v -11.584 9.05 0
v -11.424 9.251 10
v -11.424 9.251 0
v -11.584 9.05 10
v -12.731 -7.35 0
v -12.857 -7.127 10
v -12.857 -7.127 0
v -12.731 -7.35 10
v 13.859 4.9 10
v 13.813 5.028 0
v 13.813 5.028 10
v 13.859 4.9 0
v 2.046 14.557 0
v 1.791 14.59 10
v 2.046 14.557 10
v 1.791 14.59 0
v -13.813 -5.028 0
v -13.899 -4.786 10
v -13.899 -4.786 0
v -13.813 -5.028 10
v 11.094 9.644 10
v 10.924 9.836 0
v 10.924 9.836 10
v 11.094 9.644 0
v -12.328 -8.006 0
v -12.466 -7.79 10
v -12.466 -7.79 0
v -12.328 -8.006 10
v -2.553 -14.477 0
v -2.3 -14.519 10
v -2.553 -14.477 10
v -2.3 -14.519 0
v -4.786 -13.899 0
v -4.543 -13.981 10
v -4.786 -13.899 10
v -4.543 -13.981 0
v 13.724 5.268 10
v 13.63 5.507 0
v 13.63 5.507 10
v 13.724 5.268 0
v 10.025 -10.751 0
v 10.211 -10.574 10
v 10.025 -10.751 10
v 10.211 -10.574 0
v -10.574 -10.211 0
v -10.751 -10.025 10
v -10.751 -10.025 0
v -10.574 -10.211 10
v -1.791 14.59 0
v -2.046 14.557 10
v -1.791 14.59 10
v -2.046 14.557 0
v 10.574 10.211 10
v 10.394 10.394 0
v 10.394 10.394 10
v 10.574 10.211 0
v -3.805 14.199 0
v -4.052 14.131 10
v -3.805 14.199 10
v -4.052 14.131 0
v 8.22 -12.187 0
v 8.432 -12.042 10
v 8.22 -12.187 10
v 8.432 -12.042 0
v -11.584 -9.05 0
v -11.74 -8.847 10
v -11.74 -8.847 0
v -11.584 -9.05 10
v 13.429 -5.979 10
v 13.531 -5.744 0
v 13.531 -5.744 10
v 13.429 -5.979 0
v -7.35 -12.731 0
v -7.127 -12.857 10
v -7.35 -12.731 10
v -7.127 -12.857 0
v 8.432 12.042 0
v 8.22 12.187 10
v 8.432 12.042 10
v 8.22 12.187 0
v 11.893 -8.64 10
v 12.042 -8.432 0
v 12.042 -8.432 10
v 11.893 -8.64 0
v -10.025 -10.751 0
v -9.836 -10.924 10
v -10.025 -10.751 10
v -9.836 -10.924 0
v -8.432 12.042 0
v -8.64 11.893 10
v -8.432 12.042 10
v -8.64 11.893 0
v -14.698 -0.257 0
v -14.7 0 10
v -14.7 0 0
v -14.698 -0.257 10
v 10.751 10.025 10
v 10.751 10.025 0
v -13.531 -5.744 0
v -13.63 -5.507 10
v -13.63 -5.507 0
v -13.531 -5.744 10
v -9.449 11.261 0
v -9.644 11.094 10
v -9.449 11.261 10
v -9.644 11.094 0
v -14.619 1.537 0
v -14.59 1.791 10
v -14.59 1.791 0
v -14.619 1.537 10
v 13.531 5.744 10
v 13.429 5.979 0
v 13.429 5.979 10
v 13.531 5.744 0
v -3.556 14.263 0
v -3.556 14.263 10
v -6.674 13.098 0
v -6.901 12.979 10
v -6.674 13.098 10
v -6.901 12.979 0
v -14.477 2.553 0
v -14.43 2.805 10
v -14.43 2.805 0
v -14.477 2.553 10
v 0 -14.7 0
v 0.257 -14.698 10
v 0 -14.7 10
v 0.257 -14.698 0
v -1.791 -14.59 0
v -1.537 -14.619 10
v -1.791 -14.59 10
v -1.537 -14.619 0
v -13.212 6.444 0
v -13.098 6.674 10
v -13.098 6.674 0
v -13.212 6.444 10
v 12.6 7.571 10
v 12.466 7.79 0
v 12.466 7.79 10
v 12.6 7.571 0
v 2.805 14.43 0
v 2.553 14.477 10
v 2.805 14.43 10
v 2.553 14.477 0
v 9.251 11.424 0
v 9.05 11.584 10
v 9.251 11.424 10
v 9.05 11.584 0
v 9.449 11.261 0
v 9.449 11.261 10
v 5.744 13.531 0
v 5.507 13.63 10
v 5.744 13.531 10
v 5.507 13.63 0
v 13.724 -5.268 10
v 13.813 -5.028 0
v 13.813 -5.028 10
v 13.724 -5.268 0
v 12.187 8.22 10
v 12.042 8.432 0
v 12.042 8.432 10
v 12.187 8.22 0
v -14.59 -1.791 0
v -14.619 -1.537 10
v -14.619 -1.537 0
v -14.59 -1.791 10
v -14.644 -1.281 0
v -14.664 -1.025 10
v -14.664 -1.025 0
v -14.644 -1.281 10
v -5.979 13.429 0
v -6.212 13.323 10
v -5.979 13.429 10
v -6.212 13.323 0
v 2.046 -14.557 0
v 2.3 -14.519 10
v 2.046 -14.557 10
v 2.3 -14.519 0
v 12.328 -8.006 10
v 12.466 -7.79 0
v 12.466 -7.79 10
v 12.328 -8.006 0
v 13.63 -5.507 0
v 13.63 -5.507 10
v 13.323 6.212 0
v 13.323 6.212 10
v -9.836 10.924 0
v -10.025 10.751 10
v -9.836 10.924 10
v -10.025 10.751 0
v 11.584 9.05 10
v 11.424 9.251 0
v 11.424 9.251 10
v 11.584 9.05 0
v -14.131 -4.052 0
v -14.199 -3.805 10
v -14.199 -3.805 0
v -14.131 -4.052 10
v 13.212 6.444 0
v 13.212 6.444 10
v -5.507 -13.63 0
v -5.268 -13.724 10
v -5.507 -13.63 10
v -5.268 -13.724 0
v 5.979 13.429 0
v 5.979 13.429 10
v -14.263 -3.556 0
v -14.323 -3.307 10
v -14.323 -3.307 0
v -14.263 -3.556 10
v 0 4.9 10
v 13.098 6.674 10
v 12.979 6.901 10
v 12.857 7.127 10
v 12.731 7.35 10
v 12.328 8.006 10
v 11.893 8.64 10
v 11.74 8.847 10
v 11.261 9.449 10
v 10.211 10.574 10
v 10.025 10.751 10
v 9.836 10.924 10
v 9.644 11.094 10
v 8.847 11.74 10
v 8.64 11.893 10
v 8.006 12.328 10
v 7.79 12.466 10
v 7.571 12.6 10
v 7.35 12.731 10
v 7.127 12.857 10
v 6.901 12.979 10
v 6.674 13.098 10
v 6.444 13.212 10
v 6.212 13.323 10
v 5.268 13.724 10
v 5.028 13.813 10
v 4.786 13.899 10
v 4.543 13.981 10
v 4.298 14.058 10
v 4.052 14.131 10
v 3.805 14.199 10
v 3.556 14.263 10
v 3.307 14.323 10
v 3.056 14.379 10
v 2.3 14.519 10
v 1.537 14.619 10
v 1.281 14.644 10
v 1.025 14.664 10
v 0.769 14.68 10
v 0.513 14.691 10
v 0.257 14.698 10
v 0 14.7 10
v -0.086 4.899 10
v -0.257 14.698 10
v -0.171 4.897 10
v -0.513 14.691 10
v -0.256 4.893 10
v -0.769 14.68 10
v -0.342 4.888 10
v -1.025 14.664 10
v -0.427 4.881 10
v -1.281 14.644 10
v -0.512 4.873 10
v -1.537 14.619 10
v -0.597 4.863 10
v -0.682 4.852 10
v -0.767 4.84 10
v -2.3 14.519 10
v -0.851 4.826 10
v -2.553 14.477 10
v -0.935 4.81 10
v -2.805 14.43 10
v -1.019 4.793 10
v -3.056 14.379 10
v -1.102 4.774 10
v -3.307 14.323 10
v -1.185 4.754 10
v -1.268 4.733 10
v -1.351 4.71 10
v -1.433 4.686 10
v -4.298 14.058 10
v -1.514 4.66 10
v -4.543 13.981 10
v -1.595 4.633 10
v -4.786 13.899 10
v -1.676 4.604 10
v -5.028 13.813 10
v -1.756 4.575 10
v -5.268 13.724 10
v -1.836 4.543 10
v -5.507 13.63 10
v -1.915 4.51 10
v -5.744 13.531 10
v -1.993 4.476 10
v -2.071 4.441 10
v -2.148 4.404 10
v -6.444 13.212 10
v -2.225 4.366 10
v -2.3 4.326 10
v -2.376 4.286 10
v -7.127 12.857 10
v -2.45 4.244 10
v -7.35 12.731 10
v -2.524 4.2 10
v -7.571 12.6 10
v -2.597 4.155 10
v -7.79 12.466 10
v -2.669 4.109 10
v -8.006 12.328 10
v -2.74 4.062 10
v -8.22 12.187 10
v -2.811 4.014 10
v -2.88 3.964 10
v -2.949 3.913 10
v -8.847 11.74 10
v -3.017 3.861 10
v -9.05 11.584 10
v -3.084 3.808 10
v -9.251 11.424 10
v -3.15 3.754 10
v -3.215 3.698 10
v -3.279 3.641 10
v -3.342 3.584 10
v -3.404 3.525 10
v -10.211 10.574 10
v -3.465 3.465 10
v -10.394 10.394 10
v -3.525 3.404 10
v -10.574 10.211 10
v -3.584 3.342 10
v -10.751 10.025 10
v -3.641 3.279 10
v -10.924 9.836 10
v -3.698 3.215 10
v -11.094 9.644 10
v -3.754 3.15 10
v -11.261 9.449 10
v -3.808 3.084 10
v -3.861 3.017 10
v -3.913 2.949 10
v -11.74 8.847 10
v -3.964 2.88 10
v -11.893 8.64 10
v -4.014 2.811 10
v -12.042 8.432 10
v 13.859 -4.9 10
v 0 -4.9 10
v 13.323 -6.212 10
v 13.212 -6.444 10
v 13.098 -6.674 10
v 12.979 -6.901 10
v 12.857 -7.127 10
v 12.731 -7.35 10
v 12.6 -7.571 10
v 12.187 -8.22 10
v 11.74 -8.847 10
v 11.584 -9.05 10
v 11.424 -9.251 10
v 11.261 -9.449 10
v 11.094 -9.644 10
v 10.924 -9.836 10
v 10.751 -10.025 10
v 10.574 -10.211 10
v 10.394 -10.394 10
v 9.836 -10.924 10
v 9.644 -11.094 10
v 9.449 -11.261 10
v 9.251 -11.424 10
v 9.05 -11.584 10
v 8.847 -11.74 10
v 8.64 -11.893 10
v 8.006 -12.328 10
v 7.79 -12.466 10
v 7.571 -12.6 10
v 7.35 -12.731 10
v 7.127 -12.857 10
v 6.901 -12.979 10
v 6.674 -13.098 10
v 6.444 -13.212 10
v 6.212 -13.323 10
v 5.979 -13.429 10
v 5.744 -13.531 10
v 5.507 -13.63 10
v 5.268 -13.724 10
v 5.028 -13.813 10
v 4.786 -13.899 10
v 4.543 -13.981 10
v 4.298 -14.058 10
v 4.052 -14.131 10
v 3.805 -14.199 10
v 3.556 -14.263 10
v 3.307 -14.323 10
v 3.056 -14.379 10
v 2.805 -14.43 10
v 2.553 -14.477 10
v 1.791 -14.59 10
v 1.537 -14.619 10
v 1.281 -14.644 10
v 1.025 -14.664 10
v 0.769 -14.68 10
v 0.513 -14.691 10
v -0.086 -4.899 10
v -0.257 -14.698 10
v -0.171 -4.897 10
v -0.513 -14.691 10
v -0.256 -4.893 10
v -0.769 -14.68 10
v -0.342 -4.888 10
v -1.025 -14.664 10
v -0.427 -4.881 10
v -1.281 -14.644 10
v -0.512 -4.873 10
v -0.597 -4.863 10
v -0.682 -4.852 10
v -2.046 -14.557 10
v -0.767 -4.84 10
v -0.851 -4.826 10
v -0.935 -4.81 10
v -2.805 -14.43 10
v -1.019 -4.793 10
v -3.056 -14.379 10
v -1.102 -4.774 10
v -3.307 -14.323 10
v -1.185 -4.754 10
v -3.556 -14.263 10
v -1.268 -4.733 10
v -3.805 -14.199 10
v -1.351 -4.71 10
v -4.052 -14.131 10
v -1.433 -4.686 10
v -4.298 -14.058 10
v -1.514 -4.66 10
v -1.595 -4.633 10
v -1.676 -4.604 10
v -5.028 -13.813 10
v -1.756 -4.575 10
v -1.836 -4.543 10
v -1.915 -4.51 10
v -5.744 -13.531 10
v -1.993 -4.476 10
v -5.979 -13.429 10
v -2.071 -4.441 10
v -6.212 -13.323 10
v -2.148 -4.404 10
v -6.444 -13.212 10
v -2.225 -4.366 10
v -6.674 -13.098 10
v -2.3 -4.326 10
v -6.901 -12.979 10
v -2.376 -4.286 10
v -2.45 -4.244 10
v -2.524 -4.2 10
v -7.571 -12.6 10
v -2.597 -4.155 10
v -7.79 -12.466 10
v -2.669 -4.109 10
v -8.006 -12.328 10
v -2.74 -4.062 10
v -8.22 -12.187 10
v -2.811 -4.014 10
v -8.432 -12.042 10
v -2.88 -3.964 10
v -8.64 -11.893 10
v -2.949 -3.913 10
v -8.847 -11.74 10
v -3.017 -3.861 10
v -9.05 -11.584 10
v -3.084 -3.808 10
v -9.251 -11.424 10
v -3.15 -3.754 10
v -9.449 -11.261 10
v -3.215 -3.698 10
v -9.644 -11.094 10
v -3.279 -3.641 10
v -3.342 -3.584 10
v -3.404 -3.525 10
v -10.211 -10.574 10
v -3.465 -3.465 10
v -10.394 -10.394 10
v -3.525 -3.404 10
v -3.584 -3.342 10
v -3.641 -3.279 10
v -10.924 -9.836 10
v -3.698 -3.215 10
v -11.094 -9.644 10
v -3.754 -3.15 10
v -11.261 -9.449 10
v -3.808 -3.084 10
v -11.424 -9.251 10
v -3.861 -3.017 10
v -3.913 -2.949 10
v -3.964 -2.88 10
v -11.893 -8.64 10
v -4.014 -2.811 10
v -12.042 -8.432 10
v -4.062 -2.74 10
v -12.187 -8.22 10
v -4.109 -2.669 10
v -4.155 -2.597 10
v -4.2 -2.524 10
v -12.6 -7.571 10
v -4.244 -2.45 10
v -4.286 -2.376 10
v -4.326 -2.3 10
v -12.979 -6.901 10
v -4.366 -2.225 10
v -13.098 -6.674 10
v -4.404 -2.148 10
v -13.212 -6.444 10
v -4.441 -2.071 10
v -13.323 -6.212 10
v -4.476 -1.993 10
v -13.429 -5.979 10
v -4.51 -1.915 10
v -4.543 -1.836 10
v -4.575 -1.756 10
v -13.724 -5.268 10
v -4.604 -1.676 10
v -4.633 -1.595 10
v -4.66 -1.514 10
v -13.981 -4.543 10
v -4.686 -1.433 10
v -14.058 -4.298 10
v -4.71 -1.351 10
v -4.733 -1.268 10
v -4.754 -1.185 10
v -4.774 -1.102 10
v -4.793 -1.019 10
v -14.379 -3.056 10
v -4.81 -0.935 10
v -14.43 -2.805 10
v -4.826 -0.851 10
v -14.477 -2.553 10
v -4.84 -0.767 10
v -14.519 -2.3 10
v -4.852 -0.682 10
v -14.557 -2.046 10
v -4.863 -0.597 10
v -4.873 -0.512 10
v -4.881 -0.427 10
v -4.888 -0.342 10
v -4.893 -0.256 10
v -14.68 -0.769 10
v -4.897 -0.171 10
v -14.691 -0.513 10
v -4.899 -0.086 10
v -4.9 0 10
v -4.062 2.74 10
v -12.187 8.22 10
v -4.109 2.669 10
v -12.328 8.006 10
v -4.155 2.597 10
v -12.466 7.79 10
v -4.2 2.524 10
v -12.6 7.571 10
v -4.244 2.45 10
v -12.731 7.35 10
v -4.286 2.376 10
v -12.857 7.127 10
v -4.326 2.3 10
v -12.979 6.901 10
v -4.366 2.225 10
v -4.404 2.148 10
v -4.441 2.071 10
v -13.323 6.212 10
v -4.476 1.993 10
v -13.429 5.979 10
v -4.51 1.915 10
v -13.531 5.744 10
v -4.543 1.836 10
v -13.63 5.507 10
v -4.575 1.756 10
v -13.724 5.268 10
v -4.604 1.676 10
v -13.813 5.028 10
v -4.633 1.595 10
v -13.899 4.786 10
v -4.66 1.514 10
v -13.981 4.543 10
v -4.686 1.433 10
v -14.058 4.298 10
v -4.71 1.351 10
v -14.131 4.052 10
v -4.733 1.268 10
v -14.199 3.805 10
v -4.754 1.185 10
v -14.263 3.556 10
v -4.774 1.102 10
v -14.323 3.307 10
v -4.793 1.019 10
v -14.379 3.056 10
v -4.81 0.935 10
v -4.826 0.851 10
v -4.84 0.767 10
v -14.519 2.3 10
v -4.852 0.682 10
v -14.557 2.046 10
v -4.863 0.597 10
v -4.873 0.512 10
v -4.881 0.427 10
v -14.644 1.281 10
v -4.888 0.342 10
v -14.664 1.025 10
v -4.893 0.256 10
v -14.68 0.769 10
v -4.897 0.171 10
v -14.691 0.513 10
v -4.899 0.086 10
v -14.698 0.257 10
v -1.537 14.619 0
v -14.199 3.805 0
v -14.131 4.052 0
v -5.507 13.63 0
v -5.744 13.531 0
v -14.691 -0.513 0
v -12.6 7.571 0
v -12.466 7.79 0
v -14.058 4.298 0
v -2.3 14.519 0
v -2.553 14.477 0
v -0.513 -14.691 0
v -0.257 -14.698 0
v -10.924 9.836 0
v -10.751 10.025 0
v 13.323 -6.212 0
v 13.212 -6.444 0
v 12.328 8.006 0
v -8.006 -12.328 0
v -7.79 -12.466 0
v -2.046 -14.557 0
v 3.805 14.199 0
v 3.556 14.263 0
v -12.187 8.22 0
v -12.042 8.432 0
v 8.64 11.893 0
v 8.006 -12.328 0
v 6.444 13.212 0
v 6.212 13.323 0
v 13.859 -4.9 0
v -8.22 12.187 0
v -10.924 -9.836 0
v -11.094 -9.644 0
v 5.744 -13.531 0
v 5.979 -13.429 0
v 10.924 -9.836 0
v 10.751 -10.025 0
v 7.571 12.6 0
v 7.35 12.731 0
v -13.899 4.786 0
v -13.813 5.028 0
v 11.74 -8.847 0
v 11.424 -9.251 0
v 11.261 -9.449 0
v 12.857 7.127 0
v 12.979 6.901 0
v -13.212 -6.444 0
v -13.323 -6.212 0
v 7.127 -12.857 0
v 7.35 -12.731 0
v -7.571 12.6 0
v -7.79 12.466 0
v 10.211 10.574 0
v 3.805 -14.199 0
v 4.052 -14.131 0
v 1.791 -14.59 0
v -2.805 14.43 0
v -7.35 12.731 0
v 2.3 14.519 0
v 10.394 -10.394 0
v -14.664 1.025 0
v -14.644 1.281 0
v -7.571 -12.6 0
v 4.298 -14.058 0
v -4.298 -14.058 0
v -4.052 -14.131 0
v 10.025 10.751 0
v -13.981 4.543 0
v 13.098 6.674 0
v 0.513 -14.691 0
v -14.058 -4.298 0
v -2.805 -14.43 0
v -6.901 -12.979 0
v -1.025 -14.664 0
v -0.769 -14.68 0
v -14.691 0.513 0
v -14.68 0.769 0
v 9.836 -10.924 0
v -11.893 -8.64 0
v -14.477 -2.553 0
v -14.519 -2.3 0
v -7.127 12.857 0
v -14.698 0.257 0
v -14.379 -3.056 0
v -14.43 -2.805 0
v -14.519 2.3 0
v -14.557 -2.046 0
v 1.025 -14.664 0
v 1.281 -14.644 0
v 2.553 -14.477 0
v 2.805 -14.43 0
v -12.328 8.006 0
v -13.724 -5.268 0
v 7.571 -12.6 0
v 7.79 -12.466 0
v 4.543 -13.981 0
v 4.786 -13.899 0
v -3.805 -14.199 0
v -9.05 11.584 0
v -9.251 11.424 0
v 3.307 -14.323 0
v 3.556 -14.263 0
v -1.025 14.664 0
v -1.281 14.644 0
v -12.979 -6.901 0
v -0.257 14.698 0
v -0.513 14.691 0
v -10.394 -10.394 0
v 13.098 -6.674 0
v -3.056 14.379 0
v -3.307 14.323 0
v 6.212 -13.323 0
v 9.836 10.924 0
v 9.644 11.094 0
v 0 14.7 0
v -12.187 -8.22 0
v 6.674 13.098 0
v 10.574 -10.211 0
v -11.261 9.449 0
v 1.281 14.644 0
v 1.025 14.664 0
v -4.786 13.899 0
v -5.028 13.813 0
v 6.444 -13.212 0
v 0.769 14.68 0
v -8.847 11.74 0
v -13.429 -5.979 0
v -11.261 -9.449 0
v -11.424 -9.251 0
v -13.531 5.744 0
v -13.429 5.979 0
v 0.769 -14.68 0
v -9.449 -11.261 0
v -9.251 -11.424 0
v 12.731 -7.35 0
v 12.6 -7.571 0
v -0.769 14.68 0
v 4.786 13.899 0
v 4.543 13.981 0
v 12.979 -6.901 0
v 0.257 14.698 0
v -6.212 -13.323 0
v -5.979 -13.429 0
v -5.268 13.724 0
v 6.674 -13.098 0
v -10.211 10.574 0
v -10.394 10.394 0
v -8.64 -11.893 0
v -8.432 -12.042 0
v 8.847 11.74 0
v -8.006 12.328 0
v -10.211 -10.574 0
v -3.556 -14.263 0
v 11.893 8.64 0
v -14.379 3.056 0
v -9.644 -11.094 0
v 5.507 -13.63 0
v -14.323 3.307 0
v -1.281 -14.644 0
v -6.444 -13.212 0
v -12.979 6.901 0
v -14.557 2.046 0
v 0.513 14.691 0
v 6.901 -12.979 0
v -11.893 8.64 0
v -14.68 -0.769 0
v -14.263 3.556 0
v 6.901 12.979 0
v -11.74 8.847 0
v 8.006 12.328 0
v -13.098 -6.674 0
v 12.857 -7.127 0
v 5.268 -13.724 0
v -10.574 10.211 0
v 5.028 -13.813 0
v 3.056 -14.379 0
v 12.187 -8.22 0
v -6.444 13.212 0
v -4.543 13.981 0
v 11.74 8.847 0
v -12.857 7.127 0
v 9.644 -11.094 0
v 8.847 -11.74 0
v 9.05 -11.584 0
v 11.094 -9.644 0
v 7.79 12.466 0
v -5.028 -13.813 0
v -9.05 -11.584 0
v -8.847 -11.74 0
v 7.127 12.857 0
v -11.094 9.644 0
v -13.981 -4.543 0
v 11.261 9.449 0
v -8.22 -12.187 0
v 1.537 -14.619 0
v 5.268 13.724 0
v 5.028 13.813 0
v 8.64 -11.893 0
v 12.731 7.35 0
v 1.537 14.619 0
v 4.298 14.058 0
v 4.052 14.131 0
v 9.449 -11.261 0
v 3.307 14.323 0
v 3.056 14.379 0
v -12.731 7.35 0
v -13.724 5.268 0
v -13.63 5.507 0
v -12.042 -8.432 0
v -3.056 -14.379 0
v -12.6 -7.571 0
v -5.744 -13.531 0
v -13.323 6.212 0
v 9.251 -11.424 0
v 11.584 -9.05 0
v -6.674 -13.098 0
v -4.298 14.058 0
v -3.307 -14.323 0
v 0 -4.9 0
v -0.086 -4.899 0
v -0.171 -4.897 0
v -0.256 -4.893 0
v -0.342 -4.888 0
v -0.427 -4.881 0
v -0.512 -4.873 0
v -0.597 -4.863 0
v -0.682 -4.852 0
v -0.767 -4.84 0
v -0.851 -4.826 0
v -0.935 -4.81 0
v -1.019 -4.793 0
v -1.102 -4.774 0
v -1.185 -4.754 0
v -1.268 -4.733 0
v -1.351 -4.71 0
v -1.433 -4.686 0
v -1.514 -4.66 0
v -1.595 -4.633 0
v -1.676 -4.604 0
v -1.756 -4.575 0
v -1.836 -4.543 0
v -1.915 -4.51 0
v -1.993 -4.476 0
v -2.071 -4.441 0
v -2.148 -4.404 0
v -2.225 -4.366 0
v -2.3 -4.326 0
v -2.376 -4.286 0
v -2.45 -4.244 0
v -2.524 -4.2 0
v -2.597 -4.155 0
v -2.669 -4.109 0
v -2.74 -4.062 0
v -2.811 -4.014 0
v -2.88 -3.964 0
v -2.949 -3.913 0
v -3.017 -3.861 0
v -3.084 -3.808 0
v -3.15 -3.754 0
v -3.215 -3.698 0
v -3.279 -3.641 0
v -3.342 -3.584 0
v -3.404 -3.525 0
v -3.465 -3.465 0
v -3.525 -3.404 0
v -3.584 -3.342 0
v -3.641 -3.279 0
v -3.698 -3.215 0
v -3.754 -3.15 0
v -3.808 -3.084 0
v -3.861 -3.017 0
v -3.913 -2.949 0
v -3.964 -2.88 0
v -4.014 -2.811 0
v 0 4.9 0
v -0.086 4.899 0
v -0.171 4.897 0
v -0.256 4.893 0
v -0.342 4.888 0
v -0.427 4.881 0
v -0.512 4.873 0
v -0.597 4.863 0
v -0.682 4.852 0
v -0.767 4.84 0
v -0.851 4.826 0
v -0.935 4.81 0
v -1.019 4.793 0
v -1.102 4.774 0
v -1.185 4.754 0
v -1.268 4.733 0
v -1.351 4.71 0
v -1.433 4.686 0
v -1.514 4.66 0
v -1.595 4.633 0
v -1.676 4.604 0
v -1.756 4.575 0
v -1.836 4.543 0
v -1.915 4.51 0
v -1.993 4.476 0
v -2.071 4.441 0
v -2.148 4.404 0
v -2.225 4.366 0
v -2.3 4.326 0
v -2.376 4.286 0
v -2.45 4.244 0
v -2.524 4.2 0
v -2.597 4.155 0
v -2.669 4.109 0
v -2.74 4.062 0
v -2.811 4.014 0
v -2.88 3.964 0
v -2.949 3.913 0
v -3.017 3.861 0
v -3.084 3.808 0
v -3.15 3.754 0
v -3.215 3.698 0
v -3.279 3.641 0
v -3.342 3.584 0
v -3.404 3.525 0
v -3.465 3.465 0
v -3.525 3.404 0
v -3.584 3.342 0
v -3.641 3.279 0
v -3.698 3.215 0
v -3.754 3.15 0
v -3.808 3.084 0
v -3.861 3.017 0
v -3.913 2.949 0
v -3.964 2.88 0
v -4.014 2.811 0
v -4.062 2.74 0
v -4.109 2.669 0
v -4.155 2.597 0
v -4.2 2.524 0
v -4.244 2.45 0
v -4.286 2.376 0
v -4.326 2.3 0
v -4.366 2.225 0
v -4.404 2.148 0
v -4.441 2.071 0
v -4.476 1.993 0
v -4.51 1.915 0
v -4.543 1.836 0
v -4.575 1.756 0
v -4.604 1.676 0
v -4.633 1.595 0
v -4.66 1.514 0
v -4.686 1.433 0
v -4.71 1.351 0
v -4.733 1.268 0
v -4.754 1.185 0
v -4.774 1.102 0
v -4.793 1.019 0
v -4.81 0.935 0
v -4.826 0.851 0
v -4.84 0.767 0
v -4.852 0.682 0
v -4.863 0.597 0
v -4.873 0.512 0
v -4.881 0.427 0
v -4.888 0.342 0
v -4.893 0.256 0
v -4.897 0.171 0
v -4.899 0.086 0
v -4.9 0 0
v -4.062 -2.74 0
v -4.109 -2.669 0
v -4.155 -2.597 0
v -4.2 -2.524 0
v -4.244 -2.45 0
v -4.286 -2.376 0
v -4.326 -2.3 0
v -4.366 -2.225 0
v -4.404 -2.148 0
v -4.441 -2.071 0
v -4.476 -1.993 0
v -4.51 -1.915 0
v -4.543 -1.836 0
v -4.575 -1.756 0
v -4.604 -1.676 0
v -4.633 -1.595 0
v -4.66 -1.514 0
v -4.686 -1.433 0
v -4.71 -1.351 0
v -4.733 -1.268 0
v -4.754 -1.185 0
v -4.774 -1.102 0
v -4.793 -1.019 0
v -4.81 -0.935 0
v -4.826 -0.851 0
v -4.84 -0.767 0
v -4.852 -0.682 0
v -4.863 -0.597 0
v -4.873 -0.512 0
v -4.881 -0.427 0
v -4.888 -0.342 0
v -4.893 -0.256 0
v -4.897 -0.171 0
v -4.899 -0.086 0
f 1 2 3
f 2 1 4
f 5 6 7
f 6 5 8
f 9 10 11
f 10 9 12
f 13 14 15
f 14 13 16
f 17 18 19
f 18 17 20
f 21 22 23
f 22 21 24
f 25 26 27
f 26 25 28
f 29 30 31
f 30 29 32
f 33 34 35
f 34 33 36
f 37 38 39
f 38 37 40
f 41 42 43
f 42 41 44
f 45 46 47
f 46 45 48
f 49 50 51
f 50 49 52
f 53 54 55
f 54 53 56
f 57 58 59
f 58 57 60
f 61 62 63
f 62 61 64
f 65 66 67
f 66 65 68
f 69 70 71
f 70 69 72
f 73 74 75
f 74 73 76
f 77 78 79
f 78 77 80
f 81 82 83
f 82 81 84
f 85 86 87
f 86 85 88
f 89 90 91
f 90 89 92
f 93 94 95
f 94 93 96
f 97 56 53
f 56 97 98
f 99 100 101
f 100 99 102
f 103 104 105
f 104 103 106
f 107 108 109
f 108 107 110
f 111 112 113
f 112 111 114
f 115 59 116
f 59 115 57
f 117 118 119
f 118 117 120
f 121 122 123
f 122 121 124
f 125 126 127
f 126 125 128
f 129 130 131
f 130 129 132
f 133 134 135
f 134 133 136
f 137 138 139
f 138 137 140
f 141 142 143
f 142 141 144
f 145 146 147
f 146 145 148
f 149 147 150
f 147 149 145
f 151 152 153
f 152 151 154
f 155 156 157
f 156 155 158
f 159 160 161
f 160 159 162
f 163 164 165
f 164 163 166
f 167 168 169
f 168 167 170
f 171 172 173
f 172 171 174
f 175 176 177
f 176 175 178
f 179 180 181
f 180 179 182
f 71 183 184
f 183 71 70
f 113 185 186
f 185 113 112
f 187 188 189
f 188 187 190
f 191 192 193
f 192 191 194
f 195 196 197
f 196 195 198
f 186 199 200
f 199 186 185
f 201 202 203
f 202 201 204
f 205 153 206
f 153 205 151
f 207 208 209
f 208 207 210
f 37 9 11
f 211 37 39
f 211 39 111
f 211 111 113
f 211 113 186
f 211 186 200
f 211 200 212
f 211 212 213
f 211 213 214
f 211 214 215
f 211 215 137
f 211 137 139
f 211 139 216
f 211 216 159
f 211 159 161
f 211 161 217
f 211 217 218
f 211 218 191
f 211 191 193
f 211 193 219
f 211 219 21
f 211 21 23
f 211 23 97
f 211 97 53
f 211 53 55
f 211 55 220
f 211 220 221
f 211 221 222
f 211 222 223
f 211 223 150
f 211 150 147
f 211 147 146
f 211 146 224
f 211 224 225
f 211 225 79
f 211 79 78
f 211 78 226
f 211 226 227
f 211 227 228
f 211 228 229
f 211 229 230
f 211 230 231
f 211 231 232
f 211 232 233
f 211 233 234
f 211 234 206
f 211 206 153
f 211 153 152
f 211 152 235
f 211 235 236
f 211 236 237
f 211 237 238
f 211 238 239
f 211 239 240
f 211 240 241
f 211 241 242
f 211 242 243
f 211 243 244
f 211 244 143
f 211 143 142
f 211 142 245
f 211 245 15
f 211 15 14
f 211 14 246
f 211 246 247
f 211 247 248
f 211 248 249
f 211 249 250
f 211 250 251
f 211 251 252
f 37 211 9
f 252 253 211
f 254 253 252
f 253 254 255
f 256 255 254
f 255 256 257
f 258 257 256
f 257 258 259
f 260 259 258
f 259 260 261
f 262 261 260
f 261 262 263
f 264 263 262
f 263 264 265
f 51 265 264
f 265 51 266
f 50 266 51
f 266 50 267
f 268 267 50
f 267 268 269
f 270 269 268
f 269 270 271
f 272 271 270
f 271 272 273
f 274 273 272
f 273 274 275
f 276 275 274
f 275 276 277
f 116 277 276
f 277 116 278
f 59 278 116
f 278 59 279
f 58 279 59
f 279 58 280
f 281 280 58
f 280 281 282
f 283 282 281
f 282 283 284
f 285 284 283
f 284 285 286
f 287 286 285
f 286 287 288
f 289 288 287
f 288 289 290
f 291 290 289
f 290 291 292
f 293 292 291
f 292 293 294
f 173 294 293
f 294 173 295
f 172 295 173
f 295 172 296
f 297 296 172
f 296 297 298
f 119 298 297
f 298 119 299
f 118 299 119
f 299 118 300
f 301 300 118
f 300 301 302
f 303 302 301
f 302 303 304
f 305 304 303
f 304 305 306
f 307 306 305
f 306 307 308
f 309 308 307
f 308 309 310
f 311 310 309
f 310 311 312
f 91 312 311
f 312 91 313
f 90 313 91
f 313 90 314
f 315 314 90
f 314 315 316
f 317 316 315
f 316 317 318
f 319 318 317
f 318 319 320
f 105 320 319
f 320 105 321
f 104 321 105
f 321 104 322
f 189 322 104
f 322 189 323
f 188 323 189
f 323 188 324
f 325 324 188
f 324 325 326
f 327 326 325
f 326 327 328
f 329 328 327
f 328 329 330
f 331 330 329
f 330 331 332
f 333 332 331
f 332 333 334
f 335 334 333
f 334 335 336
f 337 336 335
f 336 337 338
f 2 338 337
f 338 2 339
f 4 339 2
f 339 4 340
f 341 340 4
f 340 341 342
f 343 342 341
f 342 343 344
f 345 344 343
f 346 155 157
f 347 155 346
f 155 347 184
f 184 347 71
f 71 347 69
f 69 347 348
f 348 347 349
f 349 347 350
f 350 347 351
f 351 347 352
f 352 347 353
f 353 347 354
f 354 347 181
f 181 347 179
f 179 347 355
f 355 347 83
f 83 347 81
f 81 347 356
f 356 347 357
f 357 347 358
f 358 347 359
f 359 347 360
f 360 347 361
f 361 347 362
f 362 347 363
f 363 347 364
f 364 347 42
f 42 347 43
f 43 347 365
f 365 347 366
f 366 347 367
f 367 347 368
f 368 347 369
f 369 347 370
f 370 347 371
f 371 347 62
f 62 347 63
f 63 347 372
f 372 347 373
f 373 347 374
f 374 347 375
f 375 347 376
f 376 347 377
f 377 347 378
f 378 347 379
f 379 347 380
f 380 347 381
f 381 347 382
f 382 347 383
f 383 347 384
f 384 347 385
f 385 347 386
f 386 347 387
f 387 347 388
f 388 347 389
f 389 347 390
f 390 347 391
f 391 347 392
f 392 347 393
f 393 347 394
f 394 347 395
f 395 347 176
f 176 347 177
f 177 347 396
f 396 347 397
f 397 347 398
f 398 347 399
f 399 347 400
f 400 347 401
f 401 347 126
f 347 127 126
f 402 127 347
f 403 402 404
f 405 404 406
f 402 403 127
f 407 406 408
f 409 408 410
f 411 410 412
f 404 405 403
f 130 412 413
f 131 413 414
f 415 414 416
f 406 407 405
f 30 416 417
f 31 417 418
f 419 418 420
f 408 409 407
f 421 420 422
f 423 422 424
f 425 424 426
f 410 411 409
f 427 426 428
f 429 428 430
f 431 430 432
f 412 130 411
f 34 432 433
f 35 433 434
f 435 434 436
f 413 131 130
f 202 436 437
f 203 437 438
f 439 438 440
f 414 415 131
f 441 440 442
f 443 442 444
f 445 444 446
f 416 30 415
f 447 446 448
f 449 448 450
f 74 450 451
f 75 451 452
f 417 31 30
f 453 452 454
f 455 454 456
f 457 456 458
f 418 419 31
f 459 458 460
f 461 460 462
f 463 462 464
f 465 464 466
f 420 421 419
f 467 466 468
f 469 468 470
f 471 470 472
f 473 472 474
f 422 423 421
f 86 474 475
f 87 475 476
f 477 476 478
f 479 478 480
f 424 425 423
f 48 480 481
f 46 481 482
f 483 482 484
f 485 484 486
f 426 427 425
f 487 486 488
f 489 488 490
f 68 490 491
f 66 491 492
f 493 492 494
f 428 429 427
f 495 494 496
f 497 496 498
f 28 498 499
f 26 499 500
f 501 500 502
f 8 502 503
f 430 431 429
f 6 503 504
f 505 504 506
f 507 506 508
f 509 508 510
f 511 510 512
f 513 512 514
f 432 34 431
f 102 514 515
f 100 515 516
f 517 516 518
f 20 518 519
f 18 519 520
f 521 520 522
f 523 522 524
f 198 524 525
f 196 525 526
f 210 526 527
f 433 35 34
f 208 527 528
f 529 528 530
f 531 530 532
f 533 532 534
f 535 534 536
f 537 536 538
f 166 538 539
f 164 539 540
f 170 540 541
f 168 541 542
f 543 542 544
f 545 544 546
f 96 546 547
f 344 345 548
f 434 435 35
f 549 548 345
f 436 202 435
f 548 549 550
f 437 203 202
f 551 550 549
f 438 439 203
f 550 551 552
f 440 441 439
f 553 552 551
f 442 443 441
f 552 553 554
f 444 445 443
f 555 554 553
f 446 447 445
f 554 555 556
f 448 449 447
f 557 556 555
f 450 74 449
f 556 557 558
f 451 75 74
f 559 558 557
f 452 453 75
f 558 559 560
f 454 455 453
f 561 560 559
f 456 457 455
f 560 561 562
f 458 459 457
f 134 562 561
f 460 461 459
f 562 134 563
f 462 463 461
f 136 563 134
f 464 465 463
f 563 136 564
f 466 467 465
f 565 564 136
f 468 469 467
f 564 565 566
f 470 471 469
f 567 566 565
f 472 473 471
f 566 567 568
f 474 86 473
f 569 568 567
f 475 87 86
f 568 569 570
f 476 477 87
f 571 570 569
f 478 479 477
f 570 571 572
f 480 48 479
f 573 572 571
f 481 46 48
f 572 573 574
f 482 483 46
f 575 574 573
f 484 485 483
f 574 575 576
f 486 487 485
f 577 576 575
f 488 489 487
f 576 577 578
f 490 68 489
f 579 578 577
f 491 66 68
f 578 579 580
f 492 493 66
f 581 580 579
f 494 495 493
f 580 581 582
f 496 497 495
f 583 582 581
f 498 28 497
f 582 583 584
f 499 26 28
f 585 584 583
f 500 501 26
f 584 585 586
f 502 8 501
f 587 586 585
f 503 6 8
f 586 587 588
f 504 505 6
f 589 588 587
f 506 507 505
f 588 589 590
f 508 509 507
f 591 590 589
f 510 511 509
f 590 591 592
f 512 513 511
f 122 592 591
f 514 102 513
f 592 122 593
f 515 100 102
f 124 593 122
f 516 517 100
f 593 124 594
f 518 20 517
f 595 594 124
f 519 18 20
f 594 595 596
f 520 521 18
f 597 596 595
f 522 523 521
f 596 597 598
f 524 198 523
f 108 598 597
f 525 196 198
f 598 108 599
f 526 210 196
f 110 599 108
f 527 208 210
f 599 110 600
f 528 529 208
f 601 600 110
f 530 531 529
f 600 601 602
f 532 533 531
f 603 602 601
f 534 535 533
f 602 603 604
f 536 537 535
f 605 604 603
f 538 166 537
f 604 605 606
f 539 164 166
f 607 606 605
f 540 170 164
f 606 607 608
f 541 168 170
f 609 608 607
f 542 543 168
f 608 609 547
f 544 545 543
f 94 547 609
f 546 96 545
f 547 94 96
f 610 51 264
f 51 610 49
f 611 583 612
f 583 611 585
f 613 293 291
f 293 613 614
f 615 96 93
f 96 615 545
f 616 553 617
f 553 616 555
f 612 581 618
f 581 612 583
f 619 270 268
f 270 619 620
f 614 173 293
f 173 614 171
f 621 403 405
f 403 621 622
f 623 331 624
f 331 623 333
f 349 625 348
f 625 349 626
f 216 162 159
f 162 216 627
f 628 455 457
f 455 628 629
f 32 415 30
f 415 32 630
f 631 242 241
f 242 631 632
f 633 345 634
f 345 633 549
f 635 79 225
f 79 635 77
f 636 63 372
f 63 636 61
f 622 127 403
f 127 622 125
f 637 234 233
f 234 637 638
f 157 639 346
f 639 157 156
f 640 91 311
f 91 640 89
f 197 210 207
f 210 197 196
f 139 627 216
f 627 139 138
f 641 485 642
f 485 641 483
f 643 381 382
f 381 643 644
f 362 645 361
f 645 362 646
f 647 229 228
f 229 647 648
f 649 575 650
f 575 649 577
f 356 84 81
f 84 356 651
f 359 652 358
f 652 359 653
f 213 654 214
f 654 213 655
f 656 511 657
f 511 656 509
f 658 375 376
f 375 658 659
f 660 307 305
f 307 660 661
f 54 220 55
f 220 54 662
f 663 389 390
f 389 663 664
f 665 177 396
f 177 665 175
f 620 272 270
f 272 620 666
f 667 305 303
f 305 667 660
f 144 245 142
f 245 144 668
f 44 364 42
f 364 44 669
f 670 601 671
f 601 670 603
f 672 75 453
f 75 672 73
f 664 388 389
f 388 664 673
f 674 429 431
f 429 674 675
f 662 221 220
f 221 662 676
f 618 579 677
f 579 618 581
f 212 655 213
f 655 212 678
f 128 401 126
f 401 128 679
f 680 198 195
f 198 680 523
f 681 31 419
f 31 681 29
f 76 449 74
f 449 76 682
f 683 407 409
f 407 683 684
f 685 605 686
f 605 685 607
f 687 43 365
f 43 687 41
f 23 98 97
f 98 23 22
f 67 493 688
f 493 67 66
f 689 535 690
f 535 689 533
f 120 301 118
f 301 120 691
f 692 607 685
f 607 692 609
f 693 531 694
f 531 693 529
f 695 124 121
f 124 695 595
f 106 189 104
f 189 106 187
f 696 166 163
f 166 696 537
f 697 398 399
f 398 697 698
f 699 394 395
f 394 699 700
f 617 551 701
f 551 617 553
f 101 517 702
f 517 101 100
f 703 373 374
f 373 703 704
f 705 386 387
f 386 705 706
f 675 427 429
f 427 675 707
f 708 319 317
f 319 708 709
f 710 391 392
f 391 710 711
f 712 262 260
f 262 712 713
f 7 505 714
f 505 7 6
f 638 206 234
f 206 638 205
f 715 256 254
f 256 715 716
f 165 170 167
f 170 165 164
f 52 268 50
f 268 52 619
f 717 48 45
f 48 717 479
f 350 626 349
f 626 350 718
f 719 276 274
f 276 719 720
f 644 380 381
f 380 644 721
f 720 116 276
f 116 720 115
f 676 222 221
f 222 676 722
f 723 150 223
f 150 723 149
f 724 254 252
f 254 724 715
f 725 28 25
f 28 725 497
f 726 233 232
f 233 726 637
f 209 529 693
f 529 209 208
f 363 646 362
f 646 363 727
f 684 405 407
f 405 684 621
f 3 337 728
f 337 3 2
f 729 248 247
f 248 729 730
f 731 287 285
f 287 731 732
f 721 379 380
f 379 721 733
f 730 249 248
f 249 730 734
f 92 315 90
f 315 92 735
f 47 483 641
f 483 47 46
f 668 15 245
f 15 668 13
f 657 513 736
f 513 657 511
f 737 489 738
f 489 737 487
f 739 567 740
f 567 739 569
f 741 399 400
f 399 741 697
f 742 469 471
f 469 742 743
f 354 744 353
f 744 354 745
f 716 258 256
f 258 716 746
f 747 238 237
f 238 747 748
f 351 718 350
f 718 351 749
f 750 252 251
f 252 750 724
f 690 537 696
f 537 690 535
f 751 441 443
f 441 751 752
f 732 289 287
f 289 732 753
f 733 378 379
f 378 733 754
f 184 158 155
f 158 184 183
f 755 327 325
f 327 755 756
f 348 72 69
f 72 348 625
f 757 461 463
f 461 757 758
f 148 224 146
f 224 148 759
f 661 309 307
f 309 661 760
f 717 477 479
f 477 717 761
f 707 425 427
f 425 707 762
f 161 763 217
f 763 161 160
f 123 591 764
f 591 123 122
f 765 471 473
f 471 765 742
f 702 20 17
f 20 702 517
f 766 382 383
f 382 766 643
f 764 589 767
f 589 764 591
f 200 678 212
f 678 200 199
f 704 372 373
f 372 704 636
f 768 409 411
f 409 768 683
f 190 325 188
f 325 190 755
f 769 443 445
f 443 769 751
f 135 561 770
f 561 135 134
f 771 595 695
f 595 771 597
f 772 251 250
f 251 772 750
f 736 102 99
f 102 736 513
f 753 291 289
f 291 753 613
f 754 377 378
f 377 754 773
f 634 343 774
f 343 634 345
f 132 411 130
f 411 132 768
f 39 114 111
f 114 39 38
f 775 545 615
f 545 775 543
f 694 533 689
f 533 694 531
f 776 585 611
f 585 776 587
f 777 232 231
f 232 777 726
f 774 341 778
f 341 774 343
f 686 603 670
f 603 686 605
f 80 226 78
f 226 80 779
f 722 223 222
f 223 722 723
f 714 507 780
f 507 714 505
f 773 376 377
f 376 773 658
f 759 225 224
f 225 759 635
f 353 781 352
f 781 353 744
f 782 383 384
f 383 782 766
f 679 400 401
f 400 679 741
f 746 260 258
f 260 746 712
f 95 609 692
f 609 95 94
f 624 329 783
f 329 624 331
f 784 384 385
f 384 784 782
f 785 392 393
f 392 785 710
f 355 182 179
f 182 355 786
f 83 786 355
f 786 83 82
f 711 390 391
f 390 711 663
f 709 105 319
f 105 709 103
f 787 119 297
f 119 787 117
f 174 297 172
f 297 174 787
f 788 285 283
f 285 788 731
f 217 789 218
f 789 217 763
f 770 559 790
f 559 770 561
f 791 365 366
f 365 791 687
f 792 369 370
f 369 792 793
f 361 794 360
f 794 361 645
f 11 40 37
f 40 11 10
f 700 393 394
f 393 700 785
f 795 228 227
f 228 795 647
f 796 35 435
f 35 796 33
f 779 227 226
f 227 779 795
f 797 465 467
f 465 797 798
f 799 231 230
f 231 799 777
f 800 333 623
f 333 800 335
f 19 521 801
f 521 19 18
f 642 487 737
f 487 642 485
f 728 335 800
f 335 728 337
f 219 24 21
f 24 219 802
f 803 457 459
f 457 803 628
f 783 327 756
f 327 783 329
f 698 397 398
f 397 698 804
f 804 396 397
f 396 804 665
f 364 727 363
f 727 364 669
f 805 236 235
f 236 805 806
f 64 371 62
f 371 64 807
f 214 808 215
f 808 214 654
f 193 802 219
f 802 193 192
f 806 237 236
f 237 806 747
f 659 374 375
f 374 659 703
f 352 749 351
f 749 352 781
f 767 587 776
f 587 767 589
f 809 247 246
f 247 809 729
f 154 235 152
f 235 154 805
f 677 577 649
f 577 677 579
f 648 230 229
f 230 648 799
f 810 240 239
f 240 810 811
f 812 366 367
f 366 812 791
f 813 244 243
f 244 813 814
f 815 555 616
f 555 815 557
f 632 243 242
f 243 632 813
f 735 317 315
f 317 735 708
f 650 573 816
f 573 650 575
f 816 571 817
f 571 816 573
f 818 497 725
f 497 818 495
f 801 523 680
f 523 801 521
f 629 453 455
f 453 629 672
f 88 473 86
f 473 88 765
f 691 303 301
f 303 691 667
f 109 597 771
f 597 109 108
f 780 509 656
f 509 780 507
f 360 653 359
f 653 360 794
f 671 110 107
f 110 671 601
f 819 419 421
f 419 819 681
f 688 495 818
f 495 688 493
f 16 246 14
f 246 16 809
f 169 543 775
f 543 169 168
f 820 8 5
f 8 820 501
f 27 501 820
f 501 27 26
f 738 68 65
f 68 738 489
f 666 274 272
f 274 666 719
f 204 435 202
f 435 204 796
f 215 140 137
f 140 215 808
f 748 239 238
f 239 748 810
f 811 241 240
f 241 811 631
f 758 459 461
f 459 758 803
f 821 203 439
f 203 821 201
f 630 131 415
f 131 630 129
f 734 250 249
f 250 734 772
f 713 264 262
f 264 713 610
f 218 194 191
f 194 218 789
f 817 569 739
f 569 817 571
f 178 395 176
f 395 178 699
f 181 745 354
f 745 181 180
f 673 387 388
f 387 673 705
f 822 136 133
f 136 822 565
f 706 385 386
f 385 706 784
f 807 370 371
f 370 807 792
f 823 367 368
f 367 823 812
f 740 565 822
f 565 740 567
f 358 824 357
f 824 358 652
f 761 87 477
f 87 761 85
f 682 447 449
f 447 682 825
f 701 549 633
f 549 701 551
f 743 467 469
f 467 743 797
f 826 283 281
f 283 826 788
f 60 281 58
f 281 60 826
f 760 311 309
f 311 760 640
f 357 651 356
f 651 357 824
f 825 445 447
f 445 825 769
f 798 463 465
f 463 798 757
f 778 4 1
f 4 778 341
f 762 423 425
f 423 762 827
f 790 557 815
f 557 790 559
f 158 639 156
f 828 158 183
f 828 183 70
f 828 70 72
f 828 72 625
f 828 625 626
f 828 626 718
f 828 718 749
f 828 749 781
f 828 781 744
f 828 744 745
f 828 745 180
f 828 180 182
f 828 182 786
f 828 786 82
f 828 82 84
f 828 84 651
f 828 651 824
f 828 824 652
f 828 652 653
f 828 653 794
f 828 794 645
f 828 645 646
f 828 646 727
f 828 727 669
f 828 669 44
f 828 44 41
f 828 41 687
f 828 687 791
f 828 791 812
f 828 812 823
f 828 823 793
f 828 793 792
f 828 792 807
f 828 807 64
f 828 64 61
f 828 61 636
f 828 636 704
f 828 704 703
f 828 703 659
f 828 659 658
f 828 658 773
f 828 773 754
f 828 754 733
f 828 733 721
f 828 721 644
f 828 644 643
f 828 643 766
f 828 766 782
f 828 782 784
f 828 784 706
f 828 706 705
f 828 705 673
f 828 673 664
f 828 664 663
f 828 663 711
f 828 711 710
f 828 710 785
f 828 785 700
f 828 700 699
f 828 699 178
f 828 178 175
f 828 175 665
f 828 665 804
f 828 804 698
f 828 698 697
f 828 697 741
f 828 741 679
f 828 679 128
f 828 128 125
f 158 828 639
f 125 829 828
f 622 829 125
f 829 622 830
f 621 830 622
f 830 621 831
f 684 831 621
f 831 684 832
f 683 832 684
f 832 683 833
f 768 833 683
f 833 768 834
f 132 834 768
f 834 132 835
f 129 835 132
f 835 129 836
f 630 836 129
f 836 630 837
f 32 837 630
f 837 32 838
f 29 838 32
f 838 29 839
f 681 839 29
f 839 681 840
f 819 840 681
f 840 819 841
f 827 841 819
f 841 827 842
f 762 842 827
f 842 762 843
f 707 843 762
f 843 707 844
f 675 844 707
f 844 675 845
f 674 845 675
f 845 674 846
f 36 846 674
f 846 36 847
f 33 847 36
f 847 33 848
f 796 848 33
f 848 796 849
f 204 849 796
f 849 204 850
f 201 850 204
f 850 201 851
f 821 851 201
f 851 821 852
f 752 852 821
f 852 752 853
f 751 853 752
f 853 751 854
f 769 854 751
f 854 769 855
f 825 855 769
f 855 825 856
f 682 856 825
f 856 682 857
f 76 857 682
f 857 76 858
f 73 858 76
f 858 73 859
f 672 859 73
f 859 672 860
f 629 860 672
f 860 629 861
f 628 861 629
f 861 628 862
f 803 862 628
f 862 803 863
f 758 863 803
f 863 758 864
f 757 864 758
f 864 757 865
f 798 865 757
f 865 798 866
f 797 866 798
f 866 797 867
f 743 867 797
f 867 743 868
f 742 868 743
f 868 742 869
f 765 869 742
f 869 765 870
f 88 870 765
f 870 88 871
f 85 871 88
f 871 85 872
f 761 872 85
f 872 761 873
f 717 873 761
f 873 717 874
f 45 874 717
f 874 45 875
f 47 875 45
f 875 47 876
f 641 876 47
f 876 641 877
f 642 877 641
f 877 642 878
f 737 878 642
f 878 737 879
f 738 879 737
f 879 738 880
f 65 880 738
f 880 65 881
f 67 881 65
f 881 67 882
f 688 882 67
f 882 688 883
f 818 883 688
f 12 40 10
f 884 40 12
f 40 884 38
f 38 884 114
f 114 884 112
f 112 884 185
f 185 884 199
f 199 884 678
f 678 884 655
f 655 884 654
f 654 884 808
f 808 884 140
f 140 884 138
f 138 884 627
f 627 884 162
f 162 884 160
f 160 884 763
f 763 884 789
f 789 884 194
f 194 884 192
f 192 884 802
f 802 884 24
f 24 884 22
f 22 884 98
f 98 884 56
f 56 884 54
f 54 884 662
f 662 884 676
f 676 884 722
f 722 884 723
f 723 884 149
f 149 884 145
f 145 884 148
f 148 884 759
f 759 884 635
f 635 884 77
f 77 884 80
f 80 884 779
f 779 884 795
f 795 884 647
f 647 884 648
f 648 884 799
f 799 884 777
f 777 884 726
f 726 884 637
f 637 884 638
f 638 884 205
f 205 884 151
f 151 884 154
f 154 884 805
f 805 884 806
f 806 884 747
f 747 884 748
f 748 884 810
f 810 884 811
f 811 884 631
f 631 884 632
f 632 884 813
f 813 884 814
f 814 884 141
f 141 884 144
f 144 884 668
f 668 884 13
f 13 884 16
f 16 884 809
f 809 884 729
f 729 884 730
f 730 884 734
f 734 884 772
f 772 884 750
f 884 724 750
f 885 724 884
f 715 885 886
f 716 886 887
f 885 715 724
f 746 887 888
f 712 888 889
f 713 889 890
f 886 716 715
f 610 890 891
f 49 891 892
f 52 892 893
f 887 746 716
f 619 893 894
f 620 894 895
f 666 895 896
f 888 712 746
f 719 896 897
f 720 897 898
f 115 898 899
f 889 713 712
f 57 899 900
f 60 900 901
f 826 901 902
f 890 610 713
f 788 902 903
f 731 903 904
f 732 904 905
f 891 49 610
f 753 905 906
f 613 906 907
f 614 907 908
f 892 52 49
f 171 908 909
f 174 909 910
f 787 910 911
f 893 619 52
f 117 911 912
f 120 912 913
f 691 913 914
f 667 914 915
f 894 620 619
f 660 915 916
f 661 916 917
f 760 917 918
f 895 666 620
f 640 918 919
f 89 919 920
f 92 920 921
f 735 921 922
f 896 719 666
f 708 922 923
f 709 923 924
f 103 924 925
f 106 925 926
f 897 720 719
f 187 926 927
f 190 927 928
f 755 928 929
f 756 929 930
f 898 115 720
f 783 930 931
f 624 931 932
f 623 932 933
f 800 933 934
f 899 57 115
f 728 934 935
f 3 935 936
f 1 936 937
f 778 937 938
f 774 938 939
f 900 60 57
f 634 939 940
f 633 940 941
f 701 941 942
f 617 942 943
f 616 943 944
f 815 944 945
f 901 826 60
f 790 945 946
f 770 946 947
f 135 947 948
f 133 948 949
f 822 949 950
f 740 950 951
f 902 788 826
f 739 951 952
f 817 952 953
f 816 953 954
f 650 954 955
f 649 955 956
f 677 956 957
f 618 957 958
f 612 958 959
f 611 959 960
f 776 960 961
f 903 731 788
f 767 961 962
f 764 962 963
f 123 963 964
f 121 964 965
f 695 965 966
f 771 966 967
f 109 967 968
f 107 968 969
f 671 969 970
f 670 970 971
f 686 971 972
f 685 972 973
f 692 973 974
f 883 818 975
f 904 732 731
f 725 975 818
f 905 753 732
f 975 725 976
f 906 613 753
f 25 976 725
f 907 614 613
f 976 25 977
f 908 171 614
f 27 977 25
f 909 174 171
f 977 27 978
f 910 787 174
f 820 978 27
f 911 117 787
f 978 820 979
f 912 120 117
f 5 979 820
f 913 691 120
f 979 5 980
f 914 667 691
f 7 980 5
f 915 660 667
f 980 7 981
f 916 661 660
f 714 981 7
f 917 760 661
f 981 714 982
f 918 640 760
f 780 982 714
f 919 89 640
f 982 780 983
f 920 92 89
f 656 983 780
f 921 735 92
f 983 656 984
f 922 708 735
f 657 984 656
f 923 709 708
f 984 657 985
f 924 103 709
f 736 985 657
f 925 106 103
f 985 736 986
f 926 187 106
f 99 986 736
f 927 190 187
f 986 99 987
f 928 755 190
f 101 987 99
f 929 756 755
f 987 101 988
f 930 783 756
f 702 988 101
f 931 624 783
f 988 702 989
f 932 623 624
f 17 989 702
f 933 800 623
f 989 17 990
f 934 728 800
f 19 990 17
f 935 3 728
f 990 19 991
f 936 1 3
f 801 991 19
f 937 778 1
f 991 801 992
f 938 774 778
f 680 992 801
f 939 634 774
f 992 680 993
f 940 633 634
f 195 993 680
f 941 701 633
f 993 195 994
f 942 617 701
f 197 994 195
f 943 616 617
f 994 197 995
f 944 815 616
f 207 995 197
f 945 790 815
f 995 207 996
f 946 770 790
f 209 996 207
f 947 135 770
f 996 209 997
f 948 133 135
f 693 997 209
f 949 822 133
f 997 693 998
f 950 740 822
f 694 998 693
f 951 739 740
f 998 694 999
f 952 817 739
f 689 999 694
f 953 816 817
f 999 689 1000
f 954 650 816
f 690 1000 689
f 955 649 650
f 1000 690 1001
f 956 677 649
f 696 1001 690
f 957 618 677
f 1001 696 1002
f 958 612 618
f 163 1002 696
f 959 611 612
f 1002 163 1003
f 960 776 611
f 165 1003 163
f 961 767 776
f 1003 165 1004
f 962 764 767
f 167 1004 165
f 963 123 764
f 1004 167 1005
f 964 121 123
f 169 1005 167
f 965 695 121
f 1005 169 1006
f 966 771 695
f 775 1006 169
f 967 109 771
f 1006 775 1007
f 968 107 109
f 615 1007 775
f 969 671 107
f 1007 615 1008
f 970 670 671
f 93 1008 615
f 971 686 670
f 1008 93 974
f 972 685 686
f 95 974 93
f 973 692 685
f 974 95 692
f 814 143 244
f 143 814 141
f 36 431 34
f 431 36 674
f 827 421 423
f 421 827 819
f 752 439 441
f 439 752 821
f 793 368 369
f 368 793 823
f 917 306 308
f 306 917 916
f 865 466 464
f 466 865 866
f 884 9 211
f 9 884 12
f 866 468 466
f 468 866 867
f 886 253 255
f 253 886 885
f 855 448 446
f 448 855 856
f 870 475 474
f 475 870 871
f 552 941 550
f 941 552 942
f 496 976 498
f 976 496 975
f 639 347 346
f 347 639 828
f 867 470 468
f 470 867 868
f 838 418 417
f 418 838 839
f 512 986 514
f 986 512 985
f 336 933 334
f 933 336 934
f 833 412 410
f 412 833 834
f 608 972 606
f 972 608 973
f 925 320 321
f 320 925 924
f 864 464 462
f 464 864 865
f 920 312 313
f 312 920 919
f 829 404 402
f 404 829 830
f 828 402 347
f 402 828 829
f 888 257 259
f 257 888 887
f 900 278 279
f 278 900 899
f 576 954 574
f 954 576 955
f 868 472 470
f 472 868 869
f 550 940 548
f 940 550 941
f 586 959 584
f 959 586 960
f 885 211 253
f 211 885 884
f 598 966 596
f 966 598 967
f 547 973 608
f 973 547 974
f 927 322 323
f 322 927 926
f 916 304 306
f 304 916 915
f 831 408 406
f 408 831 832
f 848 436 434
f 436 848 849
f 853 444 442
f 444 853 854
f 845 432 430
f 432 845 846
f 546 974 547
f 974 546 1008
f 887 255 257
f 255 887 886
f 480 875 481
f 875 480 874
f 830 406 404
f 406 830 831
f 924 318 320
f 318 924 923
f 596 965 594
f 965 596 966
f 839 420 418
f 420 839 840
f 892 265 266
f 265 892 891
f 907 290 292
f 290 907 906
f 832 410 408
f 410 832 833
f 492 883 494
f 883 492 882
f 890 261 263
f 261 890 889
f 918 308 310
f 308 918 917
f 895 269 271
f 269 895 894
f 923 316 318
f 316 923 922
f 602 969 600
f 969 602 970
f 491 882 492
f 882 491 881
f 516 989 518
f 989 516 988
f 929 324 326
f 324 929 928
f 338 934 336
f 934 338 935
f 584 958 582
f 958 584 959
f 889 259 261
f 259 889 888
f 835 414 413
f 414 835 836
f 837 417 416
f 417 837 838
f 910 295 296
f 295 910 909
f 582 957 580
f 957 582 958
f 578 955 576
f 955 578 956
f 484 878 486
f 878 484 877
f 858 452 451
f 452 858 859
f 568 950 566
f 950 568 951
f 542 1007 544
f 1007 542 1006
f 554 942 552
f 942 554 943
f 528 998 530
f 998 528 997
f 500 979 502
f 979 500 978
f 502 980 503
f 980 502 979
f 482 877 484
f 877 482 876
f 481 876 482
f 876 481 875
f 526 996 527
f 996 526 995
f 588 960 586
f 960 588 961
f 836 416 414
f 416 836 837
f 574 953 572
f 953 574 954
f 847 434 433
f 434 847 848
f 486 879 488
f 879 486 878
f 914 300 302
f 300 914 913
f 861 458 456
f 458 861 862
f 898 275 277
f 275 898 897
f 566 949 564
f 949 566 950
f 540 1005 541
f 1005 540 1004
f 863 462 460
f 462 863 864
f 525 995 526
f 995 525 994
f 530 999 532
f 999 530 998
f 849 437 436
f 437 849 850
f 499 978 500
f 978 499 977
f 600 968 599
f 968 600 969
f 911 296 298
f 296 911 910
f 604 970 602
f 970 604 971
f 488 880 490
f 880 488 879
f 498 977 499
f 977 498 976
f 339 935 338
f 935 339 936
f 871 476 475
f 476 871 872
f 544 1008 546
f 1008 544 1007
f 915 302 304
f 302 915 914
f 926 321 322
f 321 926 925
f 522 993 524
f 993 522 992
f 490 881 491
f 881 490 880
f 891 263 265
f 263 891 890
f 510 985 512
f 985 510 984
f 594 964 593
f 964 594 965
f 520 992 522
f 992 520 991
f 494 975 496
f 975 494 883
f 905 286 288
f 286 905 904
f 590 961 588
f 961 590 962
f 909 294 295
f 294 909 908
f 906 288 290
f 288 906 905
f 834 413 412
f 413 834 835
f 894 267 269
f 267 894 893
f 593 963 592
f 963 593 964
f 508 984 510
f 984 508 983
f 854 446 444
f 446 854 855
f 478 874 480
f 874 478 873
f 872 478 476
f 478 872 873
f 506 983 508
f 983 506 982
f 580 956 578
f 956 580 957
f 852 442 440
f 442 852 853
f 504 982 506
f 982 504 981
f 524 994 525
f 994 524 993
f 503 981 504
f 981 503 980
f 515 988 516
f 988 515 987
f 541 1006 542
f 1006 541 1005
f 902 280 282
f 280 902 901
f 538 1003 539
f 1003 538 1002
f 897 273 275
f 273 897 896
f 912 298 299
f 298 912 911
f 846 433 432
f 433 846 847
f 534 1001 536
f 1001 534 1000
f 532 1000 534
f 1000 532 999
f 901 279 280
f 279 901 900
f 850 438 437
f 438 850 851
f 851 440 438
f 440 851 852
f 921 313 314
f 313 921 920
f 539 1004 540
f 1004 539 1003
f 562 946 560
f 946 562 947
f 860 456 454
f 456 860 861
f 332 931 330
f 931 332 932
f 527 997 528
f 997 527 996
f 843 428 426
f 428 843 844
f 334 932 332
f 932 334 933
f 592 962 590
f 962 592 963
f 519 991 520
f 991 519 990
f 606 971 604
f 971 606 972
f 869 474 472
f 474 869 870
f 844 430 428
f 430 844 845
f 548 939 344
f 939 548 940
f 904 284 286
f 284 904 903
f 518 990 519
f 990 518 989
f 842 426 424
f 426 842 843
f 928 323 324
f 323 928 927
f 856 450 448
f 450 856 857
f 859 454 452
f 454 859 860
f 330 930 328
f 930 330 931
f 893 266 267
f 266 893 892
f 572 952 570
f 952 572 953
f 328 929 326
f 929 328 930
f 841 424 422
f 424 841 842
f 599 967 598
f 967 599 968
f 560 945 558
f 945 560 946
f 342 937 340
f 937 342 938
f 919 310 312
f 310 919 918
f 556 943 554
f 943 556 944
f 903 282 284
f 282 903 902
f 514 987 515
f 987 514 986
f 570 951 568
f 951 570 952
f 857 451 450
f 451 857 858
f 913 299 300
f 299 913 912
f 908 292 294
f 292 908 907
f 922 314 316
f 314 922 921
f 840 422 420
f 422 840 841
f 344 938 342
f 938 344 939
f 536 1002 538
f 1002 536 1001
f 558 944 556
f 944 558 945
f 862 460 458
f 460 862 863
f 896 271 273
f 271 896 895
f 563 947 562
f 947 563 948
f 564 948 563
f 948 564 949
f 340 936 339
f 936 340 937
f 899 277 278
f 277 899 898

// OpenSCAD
$fn=360;

dowel_diameter=9.8;
holder_diameter=3*dowel_diameter;
height=10;

difference(){
    cylinder(d=holder_diameter, h=height);
    hull(){
        cylinder(d=dowel_diameter, h=height);
        translate([holder_diameter,0,0]){
            cylinder(d=dowel_diameter, h=height);
        }
    }
}
